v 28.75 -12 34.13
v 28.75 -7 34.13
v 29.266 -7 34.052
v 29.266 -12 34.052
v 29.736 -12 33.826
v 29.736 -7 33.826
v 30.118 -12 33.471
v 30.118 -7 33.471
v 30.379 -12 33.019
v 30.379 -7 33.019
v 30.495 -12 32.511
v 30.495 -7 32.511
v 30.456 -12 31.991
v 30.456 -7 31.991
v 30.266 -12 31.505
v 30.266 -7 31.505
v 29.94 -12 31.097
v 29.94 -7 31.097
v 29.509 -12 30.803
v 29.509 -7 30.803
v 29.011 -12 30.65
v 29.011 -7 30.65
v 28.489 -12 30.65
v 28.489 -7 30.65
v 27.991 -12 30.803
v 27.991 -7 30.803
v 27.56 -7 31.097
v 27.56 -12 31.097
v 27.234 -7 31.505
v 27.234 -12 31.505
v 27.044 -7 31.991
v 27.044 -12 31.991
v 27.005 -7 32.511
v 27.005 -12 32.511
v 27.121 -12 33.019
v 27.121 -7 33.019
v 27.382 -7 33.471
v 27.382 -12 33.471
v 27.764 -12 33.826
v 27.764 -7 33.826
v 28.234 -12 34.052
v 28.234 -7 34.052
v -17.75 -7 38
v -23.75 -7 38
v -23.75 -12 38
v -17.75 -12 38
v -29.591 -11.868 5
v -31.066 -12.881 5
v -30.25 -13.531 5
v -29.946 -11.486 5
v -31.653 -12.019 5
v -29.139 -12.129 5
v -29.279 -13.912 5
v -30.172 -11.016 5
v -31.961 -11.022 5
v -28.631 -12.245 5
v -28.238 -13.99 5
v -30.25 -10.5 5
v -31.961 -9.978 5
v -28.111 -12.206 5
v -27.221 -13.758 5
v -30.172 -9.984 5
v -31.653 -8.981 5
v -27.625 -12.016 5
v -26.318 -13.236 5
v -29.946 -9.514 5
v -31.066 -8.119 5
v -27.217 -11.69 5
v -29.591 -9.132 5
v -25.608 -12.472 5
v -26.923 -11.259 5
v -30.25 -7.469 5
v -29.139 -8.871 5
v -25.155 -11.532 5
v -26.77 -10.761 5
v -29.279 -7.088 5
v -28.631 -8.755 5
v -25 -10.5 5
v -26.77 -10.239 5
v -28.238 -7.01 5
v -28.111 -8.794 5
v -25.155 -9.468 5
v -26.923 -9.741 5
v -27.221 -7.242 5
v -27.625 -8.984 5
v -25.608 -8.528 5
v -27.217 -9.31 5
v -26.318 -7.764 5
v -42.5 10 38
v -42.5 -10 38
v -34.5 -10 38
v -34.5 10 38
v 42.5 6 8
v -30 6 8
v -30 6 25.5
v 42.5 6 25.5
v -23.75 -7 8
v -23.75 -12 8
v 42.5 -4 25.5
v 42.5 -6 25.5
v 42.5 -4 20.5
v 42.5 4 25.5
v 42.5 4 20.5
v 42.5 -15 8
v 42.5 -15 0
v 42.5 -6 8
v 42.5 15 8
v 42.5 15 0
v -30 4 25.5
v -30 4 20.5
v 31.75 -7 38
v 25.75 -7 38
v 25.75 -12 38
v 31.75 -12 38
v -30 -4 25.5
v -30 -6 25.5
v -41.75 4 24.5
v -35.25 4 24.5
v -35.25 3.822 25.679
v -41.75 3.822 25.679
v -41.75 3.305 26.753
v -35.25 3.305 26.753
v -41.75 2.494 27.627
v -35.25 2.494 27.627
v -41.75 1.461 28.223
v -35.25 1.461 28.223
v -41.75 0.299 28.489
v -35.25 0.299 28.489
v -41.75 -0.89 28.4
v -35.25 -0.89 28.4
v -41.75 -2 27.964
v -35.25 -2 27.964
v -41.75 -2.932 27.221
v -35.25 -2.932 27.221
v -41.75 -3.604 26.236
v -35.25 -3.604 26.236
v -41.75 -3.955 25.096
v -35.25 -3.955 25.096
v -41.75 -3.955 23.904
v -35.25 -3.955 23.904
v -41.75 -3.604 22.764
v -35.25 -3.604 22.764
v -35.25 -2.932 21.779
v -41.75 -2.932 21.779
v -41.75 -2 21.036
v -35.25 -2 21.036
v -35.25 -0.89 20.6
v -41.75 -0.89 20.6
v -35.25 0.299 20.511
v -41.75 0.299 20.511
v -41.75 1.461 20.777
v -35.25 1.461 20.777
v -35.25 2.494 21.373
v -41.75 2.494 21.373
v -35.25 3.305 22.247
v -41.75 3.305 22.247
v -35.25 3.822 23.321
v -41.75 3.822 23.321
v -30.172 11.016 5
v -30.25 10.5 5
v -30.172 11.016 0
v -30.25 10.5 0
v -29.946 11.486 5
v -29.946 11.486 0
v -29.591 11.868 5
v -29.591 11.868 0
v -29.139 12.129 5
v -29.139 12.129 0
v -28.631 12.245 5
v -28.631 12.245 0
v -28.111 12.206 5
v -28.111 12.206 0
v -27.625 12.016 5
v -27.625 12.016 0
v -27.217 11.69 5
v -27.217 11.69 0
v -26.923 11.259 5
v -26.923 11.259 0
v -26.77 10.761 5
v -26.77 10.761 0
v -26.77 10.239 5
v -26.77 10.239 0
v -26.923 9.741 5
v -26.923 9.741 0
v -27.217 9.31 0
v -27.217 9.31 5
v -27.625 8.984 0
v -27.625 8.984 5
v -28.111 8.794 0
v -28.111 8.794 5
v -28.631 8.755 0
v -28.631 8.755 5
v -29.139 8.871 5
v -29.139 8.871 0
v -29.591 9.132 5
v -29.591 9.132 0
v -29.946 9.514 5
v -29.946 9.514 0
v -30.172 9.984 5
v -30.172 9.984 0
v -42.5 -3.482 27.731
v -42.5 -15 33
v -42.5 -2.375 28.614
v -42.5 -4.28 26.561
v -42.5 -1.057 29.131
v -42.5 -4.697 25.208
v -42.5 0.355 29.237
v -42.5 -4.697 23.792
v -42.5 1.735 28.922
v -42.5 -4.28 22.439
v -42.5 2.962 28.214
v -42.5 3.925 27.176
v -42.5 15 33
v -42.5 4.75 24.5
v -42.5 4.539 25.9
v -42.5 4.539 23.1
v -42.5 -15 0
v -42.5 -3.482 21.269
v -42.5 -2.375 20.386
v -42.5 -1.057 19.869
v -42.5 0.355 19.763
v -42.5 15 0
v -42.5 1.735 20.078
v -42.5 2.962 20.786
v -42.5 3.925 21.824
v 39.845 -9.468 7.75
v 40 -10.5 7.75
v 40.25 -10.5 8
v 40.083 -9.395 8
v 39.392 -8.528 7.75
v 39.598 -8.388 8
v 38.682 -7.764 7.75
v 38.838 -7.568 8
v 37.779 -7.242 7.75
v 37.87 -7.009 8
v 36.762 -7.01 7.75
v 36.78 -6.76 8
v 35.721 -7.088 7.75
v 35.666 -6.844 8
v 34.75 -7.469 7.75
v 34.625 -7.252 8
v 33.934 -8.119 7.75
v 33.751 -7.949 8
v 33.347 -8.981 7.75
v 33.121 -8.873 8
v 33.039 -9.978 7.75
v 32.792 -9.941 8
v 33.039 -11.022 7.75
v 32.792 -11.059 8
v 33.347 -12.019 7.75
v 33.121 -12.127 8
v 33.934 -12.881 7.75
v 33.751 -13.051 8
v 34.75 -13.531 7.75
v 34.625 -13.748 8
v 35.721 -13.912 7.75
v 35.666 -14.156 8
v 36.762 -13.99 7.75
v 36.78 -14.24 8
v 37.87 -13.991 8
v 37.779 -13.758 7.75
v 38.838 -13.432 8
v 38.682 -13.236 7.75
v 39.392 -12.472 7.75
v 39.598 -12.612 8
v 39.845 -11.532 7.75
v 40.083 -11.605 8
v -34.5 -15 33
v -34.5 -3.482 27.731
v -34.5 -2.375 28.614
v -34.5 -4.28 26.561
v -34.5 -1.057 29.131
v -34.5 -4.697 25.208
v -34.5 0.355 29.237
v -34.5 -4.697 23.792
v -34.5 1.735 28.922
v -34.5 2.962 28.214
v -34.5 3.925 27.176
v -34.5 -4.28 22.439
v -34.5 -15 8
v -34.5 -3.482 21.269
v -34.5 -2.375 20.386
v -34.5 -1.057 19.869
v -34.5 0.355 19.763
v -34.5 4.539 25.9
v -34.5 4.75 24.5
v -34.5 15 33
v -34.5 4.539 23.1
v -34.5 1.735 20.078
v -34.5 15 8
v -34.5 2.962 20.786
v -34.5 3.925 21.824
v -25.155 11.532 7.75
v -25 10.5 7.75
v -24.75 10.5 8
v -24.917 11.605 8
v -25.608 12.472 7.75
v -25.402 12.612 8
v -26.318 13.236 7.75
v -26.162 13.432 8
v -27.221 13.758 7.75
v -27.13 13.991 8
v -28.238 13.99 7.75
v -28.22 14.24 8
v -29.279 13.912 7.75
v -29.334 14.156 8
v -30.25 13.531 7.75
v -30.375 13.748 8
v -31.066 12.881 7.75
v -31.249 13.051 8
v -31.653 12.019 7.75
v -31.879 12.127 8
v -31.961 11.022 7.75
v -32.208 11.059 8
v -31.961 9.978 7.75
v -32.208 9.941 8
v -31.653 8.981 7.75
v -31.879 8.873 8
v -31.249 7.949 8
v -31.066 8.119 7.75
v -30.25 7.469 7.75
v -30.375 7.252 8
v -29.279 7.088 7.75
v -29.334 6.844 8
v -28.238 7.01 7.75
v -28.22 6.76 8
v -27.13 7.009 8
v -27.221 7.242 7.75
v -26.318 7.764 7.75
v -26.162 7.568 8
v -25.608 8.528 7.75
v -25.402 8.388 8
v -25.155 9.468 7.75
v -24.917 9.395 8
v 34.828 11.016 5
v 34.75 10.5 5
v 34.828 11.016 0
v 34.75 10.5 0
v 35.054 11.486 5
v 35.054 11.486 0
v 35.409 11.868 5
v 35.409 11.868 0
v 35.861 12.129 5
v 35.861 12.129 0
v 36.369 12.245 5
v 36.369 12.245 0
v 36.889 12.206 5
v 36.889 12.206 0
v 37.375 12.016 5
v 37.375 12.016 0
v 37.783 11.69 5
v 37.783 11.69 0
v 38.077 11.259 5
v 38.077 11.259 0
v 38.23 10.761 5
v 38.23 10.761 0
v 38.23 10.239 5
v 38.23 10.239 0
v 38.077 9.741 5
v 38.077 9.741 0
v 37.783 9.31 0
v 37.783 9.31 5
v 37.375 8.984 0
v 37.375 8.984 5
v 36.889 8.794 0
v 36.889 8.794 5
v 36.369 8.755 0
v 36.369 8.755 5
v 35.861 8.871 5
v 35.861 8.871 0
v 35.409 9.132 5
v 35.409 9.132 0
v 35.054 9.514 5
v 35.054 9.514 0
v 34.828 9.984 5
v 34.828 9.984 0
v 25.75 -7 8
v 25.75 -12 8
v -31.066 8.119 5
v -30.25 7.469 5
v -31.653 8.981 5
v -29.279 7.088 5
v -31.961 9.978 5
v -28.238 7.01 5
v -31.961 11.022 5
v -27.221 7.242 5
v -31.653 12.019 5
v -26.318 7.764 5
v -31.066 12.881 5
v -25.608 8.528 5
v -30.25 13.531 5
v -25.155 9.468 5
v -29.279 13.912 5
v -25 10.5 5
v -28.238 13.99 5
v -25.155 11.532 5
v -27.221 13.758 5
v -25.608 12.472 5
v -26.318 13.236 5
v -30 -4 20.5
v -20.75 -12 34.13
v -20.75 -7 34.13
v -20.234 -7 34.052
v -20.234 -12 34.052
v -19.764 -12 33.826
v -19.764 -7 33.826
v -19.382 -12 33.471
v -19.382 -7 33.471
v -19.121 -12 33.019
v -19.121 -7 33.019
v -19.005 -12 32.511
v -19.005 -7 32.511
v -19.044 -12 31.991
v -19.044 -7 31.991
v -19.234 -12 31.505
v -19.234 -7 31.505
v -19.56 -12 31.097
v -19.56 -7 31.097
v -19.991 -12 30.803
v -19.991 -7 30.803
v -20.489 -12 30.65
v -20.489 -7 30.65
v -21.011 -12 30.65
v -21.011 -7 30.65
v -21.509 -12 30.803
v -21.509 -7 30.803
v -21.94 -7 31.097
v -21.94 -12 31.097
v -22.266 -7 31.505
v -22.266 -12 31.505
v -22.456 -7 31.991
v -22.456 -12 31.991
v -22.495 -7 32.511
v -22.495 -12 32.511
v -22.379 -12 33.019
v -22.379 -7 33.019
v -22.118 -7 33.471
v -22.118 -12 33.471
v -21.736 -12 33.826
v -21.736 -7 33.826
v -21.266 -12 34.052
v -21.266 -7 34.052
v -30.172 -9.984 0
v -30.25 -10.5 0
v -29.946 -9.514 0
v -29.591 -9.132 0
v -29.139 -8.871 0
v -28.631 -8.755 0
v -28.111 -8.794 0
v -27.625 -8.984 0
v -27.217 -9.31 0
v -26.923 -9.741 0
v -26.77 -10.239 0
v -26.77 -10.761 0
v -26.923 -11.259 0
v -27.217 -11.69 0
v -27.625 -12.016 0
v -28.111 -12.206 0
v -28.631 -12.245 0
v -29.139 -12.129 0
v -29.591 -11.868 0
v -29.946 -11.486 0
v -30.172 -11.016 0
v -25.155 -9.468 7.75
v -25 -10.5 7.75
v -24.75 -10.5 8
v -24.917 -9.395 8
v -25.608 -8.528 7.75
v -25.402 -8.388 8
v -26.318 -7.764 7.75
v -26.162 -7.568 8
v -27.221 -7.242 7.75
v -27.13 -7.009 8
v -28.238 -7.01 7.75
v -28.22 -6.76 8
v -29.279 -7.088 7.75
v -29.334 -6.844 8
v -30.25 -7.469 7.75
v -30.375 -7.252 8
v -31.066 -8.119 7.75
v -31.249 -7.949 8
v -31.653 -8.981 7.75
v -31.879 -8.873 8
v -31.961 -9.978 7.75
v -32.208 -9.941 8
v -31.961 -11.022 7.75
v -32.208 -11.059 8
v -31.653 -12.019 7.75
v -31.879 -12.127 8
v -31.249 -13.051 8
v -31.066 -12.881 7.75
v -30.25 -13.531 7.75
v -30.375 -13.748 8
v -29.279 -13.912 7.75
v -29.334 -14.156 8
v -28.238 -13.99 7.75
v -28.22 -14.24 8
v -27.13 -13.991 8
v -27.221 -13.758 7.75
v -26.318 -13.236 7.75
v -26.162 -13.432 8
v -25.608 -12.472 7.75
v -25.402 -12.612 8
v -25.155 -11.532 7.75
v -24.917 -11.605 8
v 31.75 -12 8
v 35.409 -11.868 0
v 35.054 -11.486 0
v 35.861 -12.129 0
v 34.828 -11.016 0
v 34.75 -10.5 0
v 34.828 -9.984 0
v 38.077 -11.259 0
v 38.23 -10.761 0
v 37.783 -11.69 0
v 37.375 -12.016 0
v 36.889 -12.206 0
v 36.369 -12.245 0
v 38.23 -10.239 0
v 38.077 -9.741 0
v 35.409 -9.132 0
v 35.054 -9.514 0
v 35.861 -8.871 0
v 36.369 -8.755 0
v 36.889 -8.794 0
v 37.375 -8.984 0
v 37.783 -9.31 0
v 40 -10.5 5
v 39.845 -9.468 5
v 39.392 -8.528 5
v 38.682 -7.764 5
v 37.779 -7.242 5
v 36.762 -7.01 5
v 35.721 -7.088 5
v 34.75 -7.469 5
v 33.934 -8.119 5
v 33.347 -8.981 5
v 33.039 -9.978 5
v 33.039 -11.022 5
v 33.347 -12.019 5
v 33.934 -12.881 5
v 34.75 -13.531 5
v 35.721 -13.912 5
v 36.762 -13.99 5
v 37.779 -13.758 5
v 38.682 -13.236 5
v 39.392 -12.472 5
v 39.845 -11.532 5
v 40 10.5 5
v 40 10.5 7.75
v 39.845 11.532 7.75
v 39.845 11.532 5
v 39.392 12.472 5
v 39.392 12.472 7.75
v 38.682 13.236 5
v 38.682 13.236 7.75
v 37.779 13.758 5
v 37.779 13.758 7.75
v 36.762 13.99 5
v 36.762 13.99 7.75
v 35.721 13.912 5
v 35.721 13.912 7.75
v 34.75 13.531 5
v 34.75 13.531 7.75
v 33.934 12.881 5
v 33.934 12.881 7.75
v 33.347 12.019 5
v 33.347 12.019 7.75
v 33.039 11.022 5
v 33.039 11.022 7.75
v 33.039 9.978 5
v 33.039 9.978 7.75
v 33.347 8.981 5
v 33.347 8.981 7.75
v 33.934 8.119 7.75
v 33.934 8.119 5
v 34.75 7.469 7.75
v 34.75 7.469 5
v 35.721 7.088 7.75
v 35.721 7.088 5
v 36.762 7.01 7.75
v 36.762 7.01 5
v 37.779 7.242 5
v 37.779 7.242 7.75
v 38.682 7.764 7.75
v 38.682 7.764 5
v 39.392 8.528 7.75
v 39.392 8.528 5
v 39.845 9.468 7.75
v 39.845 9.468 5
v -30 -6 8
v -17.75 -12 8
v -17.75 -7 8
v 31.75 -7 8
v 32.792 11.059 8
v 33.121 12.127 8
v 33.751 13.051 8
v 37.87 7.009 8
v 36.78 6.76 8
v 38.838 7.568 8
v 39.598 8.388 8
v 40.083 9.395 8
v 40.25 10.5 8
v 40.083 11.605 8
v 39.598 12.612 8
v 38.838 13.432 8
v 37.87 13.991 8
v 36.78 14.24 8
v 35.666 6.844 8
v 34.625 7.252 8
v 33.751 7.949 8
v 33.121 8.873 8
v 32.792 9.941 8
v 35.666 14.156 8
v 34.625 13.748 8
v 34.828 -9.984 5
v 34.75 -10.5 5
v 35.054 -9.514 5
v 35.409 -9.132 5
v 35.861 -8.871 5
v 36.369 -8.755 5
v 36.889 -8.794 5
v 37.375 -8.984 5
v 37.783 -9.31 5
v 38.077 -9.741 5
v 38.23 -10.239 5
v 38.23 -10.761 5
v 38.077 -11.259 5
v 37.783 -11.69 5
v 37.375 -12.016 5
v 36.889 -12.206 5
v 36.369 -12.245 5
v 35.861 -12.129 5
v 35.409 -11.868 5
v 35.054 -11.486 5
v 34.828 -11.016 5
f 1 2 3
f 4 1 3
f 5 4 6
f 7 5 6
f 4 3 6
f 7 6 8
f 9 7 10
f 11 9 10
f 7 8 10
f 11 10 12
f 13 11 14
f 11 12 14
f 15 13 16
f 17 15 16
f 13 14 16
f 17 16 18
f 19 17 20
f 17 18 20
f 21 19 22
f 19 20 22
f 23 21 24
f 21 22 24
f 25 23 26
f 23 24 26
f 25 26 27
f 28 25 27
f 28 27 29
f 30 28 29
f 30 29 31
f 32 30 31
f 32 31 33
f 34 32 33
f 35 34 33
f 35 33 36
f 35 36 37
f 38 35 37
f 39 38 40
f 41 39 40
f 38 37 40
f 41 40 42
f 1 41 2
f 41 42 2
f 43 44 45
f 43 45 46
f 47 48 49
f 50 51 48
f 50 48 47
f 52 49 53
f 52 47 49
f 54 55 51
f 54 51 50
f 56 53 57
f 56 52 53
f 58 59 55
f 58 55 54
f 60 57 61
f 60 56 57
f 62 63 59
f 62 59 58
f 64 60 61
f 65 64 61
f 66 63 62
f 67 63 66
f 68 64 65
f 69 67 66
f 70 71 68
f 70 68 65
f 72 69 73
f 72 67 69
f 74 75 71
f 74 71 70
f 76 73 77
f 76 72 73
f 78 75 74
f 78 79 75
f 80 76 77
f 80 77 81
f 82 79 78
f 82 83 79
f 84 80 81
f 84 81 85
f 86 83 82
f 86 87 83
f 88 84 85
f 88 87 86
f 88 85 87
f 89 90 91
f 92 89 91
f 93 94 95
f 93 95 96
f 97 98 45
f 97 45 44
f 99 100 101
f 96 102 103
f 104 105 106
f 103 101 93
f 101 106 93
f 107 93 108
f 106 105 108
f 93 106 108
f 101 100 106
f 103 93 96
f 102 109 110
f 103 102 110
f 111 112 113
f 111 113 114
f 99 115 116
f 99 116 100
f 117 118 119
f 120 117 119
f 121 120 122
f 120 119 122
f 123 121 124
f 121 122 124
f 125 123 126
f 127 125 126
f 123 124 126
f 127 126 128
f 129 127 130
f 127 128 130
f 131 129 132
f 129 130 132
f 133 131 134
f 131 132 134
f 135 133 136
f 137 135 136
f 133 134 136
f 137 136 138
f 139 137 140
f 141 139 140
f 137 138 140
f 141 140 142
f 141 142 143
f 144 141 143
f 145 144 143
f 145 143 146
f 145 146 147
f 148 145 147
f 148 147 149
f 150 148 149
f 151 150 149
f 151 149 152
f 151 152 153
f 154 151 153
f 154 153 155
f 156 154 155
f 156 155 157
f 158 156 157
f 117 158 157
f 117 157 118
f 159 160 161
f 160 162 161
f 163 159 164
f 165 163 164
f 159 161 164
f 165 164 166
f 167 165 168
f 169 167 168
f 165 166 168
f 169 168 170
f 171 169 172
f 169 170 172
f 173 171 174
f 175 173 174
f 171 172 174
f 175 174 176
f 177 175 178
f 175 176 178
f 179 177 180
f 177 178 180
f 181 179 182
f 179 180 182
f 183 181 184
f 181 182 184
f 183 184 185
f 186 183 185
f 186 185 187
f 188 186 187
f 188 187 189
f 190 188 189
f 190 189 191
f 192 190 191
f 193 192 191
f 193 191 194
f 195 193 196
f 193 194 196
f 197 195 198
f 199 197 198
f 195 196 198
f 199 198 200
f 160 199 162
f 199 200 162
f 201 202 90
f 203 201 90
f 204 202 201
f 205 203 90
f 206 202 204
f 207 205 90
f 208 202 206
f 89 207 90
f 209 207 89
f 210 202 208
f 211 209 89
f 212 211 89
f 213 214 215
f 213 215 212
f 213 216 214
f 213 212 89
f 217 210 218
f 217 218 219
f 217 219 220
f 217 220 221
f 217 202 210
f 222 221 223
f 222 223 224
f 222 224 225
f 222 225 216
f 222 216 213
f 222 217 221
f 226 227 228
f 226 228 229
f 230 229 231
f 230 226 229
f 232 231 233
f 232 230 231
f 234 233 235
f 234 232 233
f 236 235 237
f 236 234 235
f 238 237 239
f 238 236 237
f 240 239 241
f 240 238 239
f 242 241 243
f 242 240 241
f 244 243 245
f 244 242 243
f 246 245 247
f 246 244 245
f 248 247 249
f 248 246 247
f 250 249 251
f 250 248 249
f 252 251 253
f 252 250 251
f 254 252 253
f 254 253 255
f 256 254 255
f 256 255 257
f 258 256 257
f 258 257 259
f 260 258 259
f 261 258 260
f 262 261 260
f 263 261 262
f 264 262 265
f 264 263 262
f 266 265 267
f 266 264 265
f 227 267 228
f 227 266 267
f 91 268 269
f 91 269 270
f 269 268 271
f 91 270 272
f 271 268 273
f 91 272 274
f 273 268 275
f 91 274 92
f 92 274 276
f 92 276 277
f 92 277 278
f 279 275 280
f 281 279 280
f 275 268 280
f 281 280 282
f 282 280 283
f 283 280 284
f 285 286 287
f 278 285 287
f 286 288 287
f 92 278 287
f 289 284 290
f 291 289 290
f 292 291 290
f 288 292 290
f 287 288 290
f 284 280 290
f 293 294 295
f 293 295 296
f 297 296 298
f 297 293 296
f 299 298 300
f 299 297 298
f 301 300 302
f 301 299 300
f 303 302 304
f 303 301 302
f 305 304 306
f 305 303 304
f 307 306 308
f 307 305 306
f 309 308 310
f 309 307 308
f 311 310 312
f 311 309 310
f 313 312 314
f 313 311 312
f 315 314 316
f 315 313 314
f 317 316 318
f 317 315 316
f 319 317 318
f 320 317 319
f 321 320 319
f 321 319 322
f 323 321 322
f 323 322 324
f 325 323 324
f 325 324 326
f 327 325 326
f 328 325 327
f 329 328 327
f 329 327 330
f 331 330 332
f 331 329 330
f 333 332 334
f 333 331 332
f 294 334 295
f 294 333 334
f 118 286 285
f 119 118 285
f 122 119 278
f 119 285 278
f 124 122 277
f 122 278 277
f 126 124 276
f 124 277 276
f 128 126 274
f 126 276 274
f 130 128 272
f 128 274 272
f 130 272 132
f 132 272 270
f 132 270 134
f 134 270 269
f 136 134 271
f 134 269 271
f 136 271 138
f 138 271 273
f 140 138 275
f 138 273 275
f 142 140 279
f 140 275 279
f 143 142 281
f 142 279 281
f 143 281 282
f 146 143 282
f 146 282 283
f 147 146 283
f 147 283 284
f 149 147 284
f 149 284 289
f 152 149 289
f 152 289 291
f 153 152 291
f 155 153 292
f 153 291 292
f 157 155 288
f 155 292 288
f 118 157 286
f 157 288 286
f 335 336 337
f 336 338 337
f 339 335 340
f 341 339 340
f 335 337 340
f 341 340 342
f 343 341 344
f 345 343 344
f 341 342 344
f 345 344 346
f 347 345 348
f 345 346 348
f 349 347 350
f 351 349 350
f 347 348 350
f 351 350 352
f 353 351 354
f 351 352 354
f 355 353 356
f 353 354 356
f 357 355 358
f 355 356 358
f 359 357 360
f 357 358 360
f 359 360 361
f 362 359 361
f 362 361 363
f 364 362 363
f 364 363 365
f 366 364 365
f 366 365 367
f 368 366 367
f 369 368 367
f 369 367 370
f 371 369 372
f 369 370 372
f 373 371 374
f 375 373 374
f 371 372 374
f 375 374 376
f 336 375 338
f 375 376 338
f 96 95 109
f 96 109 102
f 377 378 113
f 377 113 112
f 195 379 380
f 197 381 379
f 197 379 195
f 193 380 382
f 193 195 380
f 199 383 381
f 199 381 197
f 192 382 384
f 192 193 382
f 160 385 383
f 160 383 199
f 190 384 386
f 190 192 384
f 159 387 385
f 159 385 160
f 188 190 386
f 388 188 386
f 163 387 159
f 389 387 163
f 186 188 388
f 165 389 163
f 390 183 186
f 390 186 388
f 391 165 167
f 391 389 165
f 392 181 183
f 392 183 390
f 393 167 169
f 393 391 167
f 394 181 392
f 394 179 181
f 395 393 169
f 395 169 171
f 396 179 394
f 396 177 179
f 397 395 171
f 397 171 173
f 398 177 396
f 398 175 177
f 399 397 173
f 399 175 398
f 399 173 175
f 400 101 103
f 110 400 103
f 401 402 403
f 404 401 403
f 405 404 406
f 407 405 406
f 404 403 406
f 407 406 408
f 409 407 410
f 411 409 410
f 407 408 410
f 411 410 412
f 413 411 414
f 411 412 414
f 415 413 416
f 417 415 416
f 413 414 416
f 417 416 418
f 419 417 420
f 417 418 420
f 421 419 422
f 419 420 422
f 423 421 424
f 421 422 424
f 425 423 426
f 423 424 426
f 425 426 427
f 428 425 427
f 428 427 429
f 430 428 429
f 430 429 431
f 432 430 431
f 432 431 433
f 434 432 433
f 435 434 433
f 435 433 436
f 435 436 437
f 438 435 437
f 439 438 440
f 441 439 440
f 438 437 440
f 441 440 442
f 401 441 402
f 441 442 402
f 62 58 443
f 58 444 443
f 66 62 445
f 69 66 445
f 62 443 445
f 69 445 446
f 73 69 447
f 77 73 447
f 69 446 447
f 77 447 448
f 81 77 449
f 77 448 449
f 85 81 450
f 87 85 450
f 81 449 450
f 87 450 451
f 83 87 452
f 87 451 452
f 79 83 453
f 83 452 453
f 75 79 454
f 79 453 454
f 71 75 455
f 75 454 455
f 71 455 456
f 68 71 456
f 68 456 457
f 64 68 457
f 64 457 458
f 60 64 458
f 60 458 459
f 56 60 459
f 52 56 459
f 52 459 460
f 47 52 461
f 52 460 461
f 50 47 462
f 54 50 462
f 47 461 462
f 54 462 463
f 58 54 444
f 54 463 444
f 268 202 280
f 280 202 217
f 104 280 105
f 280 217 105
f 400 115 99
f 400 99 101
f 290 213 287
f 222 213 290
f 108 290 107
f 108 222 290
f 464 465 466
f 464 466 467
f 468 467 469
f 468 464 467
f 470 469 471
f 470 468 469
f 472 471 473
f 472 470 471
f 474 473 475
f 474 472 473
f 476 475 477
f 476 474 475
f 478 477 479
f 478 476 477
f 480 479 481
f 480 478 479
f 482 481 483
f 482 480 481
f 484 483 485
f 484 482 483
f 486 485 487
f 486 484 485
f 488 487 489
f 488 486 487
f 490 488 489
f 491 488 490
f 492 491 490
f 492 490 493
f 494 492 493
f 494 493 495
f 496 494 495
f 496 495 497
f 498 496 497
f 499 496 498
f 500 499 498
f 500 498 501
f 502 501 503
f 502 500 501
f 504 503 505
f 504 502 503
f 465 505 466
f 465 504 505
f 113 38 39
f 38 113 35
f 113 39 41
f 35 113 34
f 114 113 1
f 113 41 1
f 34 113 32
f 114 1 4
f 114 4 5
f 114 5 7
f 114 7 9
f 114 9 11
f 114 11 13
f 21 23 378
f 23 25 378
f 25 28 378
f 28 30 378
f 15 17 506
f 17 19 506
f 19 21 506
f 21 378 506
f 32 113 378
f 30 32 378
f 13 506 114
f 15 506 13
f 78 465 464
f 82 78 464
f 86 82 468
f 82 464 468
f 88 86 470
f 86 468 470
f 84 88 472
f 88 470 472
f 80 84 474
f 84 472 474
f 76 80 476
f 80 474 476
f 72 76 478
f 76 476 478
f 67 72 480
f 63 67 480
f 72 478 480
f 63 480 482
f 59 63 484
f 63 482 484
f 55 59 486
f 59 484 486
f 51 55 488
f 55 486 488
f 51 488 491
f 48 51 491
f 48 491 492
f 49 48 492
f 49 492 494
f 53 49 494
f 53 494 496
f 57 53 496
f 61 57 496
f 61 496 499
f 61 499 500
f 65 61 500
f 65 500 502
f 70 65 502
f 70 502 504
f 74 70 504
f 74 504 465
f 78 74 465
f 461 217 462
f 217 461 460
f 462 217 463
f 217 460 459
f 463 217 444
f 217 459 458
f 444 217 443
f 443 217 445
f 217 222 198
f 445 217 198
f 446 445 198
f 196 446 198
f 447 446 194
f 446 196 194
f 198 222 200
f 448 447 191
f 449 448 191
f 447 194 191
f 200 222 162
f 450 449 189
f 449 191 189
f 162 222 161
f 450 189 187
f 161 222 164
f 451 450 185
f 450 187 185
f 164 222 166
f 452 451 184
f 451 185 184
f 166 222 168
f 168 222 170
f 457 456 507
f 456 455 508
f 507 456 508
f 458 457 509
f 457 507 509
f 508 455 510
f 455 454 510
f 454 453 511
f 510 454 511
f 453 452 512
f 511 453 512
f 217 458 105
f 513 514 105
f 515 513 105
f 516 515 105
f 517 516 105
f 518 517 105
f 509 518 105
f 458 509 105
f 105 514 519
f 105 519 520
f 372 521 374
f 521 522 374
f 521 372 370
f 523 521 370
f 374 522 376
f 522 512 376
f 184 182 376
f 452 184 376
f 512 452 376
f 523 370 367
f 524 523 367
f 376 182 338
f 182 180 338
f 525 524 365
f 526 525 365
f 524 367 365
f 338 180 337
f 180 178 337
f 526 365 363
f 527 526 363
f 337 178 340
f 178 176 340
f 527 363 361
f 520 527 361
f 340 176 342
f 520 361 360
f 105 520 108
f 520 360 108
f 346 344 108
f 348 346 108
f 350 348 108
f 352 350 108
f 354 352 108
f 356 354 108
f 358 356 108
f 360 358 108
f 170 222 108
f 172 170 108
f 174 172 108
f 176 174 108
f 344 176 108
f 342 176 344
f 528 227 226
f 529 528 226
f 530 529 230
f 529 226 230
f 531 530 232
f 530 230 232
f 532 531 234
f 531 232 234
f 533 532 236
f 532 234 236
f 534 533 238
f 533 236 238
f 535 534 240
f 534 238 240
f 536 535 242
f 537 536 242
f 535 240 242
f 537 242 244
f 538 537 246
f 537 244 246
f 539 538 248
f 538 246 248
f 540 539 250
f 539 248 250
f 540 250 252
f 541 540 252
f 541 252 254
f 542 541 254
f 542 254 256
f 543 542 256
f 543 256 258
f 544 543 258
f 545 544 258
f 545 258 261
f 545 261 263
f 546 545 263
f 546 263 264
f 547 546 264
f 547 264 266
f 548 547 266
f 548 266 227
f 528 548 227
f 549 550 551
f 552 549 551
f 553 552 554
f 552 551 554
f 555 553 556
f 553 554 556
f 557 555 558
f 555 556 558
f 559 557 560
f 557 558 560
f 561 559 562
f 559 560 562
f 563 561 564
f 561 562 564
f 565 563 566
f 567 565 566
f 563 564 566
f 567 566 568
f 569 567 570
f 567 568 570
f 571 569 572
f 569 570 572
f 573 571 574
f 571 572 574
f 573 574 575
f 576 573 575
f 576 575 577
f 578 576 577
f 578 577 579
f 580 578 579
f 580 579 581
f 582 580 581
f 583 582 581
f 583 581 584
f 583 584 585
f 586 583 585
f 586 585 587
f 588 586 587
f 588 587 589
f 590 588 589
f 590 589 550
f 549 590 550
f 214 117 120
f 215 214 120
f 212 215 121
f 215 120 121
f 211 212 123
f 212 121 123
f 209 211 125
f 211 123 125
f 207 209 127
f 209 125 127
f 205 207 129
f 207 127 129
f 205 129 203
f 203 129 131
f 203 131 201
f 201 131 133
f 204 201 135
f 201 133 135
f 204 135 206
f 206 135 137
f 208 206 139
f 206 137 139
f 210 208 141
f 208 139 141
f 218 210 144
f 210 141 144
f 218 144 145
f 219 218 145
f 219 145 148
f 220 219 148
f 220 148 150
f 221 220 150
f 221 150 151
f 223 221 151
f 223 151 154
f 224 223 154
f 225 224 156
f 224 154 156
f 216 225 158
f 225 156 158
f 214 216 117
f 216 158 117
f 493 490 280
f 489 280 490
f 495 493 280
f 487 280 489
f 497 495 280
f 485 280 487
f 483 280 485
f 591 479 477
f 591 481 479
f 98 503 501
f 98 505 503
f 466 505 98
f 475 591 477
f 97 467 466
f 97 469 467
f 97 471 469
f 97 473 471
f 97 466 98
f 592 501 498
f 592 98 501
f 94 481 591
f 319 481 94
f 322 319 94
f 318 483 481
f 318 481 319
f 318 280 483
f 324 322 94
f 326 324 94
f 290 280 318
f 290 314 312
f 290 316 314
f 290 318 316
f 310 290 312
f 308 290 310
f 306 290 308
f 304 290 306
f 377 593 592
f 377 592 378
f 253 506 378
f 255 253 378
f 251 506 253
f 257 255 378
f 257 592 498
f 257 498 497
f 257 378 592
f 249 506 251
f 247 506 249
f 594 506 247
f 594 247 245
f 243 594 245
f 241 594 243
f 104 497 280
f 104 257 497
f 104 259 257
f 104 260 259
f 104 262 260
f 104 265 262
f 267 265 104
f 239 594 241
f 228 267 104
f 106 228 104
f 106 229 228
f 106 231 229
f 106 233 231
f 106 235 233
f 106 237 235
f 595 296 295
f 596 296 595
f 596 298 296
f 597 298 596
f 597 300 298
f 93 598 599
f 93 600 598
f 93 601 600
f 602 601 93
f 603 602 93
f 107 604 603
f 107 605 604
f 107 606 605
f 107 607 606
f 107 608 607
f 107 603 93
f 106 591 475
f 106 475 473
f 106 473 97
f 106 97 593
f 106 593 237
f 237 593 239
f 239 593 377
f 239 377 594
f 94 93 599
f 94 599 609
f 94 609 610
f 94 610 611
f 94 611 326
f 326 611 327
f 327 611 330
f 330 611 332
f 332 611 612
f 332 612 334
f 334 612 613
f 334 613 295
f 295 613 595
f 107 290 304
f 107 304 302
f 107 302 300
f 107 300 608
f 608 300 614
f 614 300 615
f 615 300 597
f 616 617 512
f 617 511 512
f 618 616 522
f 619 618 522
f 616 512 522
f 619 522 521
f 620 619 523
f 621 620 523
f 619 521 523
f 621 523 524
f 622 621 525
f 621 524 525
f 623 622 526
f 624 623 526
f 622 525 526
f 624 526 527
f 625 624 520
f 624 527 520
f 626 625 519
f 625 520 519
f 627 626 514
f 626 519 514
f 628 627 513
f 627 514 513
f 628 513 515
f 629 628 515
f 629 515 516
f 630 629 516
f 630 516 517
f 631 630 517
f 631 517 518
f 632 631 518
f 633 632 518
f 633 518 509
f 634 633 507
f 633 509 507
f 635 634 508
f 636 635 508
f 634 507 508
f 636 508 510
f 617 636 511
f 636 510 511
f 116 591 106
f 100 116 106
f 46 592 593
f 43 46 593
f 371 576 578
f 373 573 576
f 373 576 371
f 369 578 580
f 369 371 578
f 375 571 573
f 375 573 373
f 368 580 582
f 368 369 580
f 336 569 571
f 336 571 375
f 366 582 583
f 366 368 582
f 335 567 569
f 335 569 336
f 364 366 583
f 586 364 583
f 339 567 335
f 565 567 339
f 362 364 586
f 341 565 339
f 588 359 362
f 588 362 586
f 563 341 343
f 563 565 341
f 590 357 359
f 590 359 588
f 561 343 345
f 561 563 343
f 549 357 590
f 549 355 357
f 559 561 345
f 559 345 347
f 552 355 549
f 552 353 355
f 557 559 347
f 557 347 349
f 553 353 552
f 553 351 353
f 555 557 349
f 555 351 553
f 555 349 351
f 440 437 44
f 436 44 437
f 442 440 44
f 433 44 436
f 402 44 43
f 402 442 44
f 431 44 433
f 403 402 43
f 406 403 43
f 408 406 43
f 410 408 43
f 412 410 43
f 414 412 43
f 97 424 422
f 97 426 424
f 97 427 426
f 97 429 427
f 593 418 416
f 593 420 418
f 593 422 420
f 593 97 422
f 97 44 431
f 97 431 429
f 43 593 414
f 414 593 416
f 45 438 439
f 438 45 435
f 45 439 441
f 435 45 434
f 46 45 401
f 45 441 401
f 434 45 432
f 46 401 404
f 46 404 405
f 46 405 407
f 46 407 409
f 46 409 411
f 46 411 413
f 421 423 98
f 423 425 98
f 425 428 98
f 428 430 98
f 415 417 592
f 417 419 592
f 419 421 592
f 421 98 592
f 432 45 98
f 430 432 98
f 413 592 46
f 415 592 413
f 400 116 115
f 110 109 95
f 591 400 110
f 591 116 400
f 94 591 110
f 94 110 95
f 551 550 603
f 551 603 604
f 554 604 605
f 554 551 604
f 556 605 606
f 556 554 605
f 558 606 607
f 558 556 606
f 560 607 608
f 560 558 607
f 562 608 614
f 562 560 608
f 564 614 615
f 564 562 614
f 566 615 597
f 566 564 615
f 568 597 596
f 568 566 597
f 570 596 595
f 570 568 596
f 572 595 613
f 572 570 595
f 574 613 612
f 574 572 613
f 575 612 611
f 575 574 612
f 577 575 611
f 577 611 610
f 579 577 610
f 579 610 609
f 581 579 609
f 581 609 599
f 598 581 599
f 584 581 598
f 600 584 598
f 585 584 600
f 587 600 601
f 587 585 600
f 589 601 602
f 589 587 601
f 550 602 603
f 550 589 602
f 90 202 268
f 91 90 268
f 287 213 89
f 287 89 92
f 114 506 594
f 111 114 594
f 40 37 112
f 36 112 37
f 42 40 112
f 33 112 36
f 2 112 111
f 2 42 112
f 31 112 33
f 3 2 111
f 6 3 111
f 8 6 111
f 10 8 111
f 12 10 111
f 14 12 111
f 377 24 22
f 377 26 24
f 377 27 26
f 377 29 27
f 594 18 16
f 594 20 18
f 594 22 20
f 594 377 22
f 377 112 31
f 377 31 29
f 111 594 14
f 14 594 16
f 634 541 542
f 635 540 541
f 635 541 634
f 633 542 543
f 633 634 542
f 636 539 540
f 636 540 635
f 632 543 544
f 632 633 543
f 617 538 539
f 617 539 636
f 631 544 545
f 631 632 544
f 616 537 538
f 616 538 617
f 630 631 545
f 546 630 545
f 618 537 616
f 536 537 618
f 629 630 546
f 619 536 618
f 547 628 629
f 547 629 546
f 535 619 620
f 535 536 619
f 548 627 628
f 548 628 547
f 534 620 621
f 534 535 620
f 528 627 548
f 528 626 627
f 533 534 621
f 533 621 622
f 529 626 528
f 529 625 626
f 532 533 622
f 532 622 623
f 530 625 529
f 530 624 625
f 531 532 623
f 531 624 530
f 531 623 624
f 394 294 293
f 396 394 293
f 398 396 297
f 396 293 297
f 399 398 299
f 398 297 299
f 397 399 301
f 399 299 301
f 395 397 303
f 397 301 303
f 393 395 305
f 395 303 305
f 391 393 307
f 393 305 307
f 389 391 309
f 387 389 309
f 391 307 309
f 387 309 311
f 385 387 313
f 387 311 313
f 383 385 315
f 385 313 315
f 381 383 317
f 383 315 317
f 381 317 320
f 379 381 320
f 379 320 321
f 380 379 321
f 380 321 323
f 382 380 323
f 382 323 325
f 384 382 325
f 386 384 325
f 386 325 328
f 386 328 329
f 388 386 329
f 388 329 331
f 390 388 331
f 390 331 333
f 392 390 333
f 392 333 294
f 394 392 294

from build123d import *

# Parameters (mm, degrees)
CROQUIS1_W                                           = 85
CROQUIS1_H                                           = 30
EXTRUIR1_DEPTH                                       = 8
CROQUIS2_W                                           = 8
CROQUIS2_H                                           = 30
EXTRUIR2_DEPTH                                       = 30
CROQUIS3_W                                           = 72.5
CROQUIS3_H                                           = 12
EXTRUIR3_DEPTH                                       = 17.5
CROQUIS4_W                                           = 5
CROQUIS4_H                                           = 8
CORTAR_EXTRUIR1_DEPTH                                = 72.5
CHAFL_N1_SIZE                                        = 5
CROQUIS5_R                                           = 4
CORTAR_EXTRUIR2_DEPTH                                = 20
CHAFL_N2_SIZE                                        = 0.75
REFRENTADO_PARA_TORNILLO_DE_CABEZA_ALLEN_D           = 3.5
REFRENTADO_PARA_TORNILLO_DE_CABEZA_ALLEN_CBORE_D     = 7
REFRENTADO_PARA_TORNILLO_DE_CABEZA_ALLEN_CBORE_DEPTH = 3
CHAFL_N3_SIZE                                        = 0.25
CROQUIS9_W                                           = 6
CROQUIS9_H                                           = 5
SALIENTE_EXTRUIR1_DEPTH                              = 30
CROQUIS10_R                                          = 1.75
CORTAR_EXTRUIR3_DEPTH                                = 5
CROQUIS11_R                                          = 1.75
CORTAR_EXTRUIR4_DEPTH                                = 5


with BuildPart() as part:
    # Croquis1 → Extruir1 (new body)
    with BuildSketch(Plane.XY):
        Rectangle(CROQUIS1_W, CROQUIS1_H)
    extrude(amount=EXTRUIR1_DEPTH)

    # Croquis2 → Extruir2 (add)
    with BuildSketch(Plane.XY.offset(8)):
        with Locations((-38.5, 0)):
            Rectangle(CROQUIS2_W, CROQUIS2_H)
    extrude(amount=EXTRUIR2_DEPTH)

    # Croquis3 → Extruir3 (add)
    with BuildSketch(Plane.XY.offset(8)):
        with Locations((6.25, 0)):
            Rectangle(CROQUIS3_W, CROQUIS3_H)
    extrude(amount=EXTRUIR3_DEPTH)

    # Croquis4 → Cortar-Extruir1 (cut)
    with BuildSketch(Plane(origin=(42.5, 0, 0), x_dir=(0, 0, -1), z_dir=(1, 0, 0))):
        with Locations((-23, 0)):
            Rectangle(CROQUIS4_W, CROQUIS4_H)
    extrude(amount=-CORTAR_EXTRUIR1_DEPTH, mode=Mode.SUBTRACT)

    # Chaflán1
    chafl_n1_edges = [part.edges().sort_by_distance(p)[0] for p in [
        (-38.5, -15, 38),
        (-38.5, 15, 38),
    ]]
    chamfer(chafl_n1_edges, length=CHAFL_N1_SIZE)

    # Croquis5 → Cortar-Extruir2 (cut)
    with BuildSketch(Plane(origin=(-34.5, 0, 0), x_dir=(0, 0, -1), z_dir=(1, 0, 0))):
        with Locations(Location((-24.5, 0, 0), (0, 0, 90))):
            Circle(CROQUIS5_R)
    extrude(amount=-CORTAR_EXTRUIR2_DEPTH, mode=Mode.SUBTRACT)

    # Chaflán2
    chafl_n2_edges = [part.edges().sort_by_distance(p)[0] for p in [
        (-42.5, -4, 24.5),
        (-34.5, -4, 24.5),
    ]]
    chamfer(chafl_n2_edges, length=CHAFL_N2_SIZE)

    # Refrentado para tornillo de cabeza allen de M6-1 (through all)
    with Locations(Plane.XY.offset(8)):
        with Locations((-28.5, 10.5), (-28.5, -10.5), (36.5, -10.5), (36.5, 10.5)):
            CounterBoreHole(REFRENTADO_PARA_TORNILLO_DE_CABEZA_ALLEN_D / 2, REFRENTADO_PARA_TORNILLO_DE_CABEZA_ALLEN_CBORE_D / 2, REFRENTADO_PARA_TORNILLO_DE_CABEZA_ALLEN_CBORE_DEPTH)

    # Chaflán3
    chafl_n3_edges = [part.edges().sort_by_distance(p)[0] for p in [
        (-32, 10.5, 8),
        (33, 10.5, 8),
        (33, -10.5, 8),
        (-32, -10.5, 8),
    ]]
    chamfer(chafl_n3_edges, length=CHAFL_N3_SIZE)

    # Croquis9 → Saliente-Extruir1 (add)
    with BuildSketch(Plane.XY.offset(8)):
        with Locations((-20.75, -9.5)):
            Rectangle(CROQUIS9_W, CROQUIS9_H)
        with Locations((28.75, -9.5)):
            Rectangle(CROQUIS9_W, CROQUIS9_H)
    extrude(amount=SALIENTE_EXTRUIR1_DEPTH)

    # Croquis10 → Cortar-Extruir3 (cut)
    with BuildSketch(Plane(origin=(0, -7, 0), x_dir=(1, 0, 0), z_dir=(0, 1, 0))):
        with Locations(Location((-20.75, -32.38, 0), (0, 0, 270))):
            Circle(CROQUIS10_R)
    extrude(amount=-CORTAR_EXTRUIR3_DEPTH, mode=Mode.SUBTRACT)

    # Croquis11 → Cortar-Extruir4 (cut)
    with BuildSketch(Plane(origin=(0, -7, 0), x_dir=(1, 0, 0), z_dir=(0, 1, 0))):
        with Locations(Location((28.75, -32.38, 0), (0, 0, 270))):
            Circle(CROQUIS11_R)
    extrude(amount=-CORTAR_EXTRUIR4_DEPTH, mode=Mode.SUBTRACT)


solid = part.part
